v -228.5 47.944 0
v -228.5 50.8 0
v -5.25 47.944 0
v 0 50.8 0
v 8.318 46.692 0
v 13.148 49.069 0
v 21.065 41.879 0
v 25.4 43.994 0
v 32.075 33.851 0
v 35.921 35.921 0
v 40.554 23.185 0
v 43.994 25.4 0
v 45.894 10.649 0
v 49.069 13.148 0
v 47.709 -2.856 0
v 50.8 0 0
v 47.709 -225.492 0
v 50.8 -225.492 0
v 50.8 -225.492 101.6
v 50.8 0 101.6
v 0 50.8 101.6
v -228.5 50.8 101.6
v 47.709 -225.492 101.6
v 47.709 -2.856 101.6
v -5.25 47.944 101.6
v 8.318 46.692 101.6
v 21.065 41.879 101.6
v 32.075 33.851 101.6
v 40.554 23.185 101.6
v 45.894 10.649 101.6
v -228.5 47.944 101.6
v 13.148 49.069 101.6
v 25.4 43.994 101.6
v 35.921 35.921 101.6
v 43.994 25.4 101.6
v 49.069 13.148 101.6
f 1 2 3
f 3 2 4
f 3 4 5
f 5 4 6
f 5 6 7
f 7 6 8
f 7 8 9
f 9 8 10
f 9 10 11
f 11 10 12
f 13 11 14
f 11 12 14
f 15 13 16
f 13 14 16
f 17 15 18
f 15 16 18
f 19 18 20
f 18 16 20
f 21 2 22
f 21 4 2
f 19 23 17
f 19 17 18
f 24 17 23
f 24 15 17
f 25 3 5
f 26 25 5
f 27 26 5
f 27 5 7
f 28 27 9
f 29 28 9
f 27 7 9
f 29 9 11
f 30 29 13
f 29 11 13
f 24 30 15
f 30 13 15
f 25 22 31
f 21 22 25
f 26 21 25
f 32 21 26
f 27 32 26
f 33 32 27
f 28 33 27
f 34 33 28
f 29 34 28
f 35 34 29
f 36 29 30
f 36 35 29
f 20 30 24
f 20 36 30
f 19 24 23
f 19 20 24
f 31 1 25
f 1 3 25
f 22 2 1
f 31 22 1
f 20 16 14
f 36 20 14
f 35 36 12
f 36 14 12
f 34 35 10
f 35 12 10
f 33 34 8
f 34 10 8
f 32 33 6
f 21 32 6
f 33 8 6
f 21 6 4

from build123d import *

# Parameters (mm, degrees)
F1_DEPTH = 101.6
F2_DEPTH = 152.4
F3_DEPTH = 152.4


with BuildPart() as f1:
    # F0 (on Top) → F1 (new body)
    with BuildSketch(Plane.XY):
        with BuildLine():
            Line((50.8, -73.0918422341), (50.8, 0))
            ThreePointArc((50.8, 0), (35.9210244843, 35.9210244843), (0, 50.8))
            Line((0, 50.8), (-76.0997384787, 50.8))
            Line((-76.0997384787, 50.8), (-76.0997384787, 47.9443576366))
            Line((-76.0997384787, 47.9443576366), (-5.2502147954, 47.9443576366))
            ThreePointArc((-5.2502147954, 47.9443576366), (32.074779717, 33.8507856659), (47.7087852046, -2.8556423634))
            Line((47.7087852046, -2.8556423634), (47.7087852046, -73.0918422341))
            Line((47.7087852046, -73.0918422341), (50.8, -73.0918422341))
        make_face()
    extrude(amount=F1_DEPTH)

    # F2 (add): a face of the model
    f2_faces = [f1.faces().sort_by_distance(p)[0] for p in [
        (49.2543926023, -73.0918422341, 50.8),
    ]]
    extrude(f2_faces, amount=F2_DEPTH)

    # F3 (add): a face of the model
    f3_faces = [f1.faces().sort_by_distance(p)[0] for p in [
        (-76.0997384787, 49.3721788183, 50.8),
    ]]
    extrude(f3_faces, amount=F3_DEPTH)


solid = f1.part
